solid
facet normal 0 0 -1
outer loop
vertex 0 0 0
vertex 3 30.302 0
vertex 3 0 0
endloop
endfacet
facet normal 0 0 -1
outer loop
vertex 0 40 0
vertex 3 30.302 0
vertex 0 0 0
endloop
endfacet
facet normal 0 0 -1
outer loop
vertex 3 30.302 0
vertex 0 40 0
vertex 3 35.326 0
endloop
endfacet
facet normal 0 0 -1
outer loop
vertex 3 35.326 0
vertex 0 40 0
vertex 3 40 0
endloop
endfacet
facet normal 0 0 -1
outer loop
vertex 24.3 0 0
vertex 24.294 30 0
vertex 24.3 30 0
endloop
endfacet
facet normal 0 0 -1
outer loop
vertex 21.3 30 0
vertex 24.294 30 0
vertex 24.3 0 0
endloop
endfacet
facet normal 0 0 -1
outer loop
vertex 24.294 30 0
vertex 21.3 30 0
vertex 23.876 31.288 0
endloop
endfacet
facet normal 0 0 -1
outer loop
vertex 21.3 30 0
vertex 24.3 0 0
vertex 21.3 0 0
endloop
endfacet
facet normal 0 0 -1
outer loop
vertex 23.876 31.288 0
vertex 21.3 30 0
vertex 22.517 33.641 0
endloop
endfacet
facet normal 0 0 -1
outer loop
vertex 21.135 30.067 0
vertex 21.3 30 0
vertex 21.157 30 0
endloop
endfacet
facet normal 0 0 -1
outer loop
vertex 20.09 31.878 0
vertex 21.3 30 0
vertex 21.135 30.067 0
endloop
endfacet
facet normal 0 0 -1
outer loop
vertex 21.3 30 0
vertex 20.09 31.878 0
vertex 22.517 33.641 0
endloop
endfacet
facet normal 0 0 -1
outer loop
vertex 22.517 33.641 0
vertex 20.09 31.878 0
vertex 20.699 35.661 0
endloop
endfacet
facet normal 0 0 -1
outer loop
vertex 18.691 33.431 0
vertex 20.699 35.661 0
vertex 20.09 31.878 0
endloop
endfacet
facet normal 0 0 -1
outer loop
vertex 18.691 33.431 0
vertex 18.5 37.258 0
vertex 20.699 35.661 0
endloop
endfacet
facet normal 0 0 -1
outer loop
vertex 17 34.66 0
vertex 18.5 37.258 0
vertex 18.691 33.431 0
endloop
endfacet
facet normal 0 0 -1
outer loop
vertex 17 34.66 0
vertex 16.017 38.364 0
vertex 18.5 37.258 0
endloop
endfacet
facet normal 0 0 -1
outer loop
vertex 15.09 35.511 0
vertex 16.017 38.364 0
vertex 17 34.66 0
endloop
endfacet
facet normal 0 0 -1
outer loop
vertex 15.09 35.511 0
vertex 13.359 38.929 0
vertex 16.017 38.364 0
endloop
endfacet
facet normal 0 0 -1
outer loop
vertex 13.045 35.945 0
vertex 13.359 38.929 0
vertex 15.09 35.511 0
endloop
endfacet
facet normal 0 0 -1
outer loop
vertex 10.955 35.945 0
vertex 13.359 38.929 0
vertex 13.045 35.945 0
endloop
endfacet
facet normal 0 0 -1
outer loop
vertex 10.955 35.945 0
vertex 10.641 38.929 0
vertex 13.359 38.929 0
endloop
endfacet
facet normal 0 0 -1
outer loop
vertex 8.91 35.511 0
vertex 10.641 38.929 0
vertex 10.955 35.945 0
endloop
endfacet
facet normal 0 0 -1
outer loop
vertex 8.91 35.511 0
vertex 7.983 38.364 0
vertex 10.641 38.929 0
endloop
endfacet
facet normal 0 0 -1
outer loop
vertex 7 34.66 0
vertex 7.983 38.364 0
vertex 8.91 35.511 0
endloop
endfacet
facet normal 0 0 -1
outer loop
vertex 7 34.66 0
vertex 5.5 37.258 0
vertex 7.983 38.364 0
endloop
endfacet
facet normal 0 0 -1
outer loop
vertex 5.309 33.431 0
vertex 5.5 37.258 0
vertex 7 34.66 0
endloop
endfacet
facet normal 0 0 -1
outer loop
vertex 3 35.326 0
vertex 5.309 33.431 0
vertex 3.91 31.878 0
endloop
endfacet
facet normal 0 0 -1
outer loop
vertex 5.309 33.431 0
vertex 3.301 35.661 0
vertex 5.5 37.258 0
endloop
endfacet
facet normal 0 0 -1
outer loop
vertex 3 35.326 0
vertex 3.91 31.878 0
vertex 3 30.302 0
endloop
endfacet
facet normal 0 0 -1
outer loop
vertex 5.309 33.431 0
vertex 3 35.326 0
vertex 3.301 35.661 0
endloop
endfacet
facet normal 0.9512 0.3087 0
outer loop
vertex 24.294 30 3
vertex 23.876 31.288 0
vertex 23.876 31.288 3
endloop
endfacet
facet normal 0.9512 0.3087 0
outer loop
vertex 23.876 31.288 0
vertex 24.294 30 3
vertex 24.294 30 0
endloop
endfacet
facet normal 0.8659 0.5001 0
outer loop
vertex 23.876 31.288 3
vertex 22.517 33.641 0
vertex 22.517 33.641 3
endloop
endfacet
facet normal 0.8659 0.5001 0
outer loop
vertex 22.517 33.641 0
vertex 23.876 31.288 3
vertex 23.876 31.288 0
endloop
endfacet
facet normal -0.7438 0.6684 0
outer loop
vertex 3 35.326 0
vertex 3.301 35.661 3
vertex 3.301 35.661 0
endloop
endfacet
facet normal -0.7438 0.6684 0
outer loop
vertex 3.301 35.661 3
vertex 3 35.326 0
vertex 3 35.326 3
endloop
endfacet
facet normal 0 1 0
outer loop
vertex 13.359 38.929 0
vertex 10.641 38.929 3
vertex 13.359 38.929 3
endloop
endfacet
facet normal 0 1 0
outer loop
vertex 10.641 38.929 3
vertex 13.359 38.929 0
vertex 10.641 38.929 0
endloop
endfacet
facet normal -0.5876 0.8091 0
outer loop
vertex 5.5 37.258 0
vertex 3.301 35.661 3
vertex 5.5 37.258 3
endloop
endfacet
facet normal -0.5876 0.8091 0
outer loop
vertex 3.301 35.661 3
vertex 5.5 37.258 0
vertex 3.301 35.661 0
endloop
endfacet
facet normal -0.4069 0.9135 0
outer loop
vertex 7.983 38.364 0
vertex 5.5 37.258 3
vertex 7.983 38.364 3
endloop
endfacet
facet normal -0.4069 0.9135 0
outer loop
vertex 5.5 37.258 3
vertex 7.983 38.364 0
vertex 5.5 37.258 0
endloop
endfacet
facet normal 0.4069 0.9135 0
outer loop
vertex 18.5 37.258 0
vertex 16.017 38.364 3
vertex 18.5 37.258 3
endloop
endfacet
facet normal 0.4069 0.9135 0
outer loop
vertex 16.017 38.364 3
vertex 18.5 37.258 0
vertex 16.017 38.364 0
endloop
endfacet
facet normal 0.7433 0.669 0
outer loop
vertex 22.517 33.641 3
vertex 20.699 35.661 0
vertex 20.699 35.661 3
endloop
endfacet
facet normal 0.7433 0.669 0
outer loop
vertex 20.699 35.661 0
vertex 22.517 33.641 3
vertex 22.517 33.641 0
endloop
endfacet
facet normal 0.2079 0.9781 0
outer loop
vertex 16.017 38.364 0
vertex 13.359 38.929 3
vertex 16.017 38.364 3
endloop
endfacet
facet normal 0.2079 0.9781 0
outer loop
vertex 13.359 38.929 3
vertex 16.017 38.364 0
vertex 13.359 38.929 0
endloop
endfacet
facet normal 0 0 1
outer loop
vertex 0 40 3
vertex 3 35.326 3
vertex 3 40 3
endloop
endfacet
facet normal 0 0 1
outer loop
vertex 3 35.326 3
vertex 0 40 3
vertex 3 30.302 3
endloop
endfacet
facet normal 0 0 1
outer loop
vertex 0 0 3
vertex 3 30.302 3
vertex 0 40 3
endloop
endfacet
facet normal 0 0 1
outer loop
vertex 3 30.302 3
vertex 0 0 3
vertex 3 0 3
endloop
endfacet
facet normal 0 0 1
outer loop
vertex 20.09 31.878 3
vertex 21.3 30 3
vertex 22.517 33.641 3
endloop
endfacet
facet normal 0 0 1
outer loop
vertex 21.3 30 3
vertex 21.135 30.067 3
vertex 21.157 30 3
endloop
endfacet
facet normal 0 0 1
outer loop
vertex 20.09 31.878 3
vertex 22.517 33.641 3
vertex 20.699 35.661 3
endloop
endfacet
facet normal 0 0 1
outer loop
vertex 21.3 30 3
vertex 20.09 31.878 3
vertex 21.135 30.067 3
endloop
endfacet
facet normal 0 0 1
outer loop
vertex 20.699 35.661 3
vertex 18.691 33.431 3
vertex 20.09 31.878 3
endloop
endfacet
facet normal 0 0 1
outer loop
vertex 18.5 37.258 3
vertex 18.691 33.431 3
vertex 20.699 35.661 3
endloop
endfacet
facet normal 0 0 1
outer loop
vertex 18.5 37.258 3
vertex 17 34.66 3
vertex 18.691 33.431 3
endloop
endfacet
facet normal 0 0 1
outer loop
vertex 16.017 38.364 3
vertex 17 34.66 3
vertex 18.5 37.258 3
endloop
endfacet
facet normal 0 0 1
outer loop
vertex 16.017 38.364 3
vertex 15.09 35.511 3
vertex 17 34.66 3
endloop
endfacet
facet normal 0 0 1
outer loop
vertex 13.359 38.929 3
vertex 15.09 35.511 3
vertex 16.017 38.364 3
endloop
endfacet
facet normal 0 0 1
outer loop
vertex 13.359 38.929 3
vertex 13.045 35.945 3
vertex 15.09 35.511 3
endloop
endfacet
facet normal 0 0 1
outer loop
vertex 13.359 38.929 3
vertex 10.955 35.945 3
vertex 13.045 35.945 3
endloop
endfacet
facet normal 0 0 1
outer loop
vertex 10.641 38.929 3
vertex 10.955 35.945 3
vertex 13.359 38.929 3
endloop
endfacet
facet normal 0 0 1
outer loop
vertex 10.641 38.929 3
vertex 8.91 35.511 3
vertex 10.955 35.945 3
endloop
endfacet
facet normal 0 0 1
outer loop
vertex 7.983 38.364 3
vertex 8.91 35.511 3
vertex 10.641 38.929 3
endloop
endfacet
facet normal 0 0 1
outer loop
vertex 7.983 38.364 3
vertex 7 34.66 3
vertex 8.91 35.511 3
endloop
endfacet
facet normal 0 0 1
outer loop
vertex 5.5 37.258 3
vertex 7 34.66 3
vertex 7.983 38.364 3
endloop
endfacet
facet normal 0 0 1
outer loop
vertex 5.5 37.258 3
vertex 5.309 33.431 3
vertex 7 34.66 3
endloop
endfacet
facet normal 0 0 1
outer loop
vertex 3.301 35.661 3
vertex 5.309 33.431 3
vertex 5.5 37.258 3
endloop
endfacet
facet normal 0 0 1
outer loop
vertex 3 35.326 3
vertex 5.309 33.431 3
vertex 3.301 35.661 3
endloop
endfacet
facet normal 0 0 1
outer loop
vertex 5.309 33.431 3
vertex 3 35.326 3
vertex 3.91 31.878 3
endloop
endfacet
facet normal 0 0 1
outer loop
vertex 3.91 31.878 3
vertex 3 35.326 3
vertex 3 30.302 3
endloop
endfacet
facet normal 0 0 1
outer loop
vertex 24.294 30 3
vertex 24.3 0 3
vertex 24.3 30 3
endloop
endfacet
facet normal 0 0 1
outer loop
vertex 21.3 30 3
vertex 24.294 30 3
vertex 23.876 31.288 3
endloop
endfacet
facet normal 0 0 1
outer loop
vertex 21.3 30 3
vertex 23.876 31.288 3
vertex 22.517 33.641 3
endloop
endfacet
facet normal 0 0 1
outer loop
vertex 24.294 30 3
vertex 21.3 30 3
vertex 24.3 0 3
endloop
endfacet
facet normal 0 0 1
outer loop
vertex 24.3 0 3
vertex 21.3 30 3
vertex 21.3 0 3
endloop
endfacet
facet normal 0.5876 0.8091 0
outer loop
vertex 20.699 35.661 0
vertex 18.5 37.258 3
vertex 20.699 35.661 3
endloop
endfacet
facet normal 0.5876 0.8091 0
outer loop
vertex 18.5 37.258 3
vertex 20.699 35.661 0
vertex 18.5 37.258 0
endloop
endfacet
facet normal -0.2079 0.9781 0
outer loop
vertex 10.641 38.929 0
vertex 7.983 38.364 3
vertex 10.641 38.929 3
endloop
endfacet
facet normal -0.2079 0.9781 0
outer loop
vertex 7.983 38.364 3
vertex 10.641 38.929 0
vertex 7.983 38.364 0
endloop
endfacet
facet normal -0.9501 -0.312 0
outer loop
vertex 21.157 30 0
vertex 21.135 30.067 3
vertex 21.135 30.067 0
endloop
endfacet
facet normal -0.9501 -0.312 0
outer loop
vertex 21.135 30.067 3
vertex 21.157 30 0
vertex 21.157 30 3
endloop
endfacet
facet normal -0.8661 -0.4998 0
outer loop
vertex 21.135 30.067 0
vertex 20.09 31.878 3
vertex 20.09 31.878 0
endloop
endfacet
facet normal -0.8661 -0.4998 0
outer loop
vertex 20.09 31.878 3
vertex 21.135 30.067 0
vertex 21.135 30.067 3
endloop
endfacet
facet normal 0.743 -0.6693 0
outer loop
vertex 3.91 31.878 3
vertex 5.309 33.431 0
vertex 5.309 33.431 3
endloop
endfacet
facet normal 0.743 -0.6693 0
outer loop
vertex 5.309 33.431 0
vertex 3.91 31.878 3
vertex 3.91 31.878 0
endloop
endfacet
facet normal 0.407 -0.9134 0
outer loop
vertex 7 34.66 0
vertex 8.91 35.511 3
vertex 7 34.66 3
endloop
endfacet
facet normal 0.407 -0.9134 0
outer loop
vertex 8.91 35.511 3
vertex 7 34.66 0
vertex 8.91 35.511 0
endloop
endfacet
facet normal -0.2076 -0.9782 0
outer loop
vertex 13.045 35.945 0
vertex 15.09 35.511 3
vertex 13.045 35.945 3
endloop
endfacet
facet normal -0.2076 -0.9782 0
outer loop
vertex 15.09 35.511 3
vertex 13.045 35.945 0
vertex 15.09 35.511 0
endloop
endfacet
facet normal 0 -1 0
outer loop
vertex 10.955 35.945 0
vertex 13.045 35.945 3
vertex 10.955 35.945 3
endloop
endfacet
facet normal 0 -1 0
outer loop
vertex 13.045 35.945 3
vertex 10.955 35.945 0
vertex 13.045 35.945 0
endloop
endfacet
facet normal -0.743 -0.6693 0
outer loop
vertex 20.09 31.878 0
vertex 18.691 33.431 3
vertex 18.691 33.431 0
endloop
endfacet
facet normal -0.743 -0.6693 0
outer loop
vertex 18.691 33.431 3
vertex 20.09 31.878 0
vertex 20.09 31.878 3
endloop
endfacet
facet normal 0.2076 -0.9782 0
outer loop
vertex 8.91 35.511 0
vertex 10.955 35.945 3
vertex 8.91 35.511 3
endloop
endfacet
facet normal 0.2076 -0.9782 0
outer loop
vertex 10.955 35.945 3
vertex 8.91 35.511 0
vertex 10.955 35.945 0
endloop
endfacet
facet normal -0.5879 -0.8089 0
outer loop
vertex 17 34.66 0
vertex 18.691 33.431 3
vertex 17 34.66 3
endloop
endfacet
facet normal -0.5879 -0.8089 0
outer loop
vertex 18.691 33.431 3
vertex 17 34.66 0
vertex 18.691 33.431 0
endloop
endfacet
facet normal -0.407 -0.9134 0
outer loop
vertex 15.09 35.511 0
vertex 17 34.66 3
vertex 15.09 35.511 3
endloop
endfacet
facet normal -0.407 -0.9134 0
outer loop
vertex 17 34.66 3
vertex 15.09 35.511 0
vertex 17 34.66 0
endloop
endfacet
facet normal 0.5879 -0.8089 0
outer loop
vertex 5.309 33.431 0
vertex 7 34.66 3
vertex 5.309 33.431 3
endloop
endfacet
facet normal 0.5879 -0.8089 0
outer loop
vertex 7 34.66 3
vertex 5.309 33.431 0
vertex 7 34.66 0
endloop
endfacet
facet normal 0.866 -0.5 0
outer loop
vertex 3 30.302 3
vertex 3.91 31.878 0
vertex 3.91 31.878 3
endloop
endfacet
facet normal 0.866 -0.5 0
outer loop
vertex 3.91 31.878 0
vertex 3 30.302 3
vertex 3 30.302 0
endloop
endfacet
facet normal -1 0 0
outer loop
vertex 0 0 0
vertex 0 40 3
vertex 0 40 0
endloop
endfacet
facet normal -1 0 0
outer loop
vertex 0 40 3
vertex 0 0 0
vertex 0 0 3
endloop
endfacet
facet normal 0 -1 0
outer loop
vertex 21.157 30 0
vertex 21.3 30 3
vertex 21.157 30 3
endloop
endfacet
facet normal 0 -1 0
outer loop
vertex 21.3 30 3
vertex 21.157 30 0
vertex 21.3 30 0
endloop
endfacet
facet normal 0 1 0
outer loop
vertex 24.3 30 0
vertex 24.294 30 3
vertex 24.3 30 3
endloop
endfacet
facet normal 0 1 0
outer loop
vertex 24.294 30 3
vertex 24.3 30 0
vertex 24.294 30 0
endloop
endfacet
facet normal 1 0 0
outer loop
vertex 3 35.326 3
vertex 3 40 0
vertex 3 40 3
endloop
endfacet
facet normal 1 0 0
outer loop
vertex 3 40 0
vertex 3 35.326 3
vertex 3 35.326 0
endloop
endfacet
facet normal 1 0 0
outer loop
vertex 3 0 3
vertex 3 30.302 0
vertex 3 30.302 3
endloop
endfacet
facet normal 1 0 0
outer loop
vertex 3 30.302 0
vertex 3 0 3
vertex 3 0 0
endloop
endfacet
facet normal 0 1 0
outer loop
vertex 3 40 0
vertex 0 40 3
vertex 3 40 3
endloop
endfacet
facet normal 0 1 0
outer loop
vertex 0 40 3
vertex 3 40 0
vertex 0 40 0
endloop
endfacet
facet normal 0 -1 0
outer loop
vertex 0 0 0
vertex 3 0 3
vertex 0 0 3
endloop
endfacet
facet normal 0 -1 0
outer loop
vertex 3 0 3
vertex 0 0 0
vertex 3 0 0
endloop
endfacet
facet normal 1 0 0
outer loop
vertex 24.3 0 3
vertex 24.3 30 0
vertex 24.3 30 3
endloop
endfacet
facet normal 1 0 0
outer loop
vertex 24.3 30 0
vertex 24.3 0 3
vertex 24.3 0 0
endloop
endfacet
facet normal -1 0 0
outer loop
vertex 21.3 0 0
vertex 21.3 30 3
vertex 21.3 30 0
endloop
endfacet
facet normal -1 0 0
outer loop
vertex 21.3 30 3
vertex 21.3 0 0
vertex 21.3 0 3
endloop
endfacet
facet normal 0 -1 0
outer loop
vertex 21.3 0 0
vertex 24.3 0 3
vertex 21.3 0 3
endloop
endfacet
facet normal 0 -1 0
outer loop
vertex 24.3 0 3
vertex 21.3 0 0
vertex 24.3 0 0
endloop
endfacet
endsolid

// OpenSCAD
//n
union(){
cube([3,40,3]);
difference(){  
  translate([12,26,0]) cylinder(3,13,13);
  translate([12,26,-1]) cylinder(5,10,10);
  translate([0,10,-1]) cube([30,20,5]);
  translate([-3,0,-1]) cube([3,40,5]);

}
  translate([21.3,0,0]) cube([3,30,3]);
}
